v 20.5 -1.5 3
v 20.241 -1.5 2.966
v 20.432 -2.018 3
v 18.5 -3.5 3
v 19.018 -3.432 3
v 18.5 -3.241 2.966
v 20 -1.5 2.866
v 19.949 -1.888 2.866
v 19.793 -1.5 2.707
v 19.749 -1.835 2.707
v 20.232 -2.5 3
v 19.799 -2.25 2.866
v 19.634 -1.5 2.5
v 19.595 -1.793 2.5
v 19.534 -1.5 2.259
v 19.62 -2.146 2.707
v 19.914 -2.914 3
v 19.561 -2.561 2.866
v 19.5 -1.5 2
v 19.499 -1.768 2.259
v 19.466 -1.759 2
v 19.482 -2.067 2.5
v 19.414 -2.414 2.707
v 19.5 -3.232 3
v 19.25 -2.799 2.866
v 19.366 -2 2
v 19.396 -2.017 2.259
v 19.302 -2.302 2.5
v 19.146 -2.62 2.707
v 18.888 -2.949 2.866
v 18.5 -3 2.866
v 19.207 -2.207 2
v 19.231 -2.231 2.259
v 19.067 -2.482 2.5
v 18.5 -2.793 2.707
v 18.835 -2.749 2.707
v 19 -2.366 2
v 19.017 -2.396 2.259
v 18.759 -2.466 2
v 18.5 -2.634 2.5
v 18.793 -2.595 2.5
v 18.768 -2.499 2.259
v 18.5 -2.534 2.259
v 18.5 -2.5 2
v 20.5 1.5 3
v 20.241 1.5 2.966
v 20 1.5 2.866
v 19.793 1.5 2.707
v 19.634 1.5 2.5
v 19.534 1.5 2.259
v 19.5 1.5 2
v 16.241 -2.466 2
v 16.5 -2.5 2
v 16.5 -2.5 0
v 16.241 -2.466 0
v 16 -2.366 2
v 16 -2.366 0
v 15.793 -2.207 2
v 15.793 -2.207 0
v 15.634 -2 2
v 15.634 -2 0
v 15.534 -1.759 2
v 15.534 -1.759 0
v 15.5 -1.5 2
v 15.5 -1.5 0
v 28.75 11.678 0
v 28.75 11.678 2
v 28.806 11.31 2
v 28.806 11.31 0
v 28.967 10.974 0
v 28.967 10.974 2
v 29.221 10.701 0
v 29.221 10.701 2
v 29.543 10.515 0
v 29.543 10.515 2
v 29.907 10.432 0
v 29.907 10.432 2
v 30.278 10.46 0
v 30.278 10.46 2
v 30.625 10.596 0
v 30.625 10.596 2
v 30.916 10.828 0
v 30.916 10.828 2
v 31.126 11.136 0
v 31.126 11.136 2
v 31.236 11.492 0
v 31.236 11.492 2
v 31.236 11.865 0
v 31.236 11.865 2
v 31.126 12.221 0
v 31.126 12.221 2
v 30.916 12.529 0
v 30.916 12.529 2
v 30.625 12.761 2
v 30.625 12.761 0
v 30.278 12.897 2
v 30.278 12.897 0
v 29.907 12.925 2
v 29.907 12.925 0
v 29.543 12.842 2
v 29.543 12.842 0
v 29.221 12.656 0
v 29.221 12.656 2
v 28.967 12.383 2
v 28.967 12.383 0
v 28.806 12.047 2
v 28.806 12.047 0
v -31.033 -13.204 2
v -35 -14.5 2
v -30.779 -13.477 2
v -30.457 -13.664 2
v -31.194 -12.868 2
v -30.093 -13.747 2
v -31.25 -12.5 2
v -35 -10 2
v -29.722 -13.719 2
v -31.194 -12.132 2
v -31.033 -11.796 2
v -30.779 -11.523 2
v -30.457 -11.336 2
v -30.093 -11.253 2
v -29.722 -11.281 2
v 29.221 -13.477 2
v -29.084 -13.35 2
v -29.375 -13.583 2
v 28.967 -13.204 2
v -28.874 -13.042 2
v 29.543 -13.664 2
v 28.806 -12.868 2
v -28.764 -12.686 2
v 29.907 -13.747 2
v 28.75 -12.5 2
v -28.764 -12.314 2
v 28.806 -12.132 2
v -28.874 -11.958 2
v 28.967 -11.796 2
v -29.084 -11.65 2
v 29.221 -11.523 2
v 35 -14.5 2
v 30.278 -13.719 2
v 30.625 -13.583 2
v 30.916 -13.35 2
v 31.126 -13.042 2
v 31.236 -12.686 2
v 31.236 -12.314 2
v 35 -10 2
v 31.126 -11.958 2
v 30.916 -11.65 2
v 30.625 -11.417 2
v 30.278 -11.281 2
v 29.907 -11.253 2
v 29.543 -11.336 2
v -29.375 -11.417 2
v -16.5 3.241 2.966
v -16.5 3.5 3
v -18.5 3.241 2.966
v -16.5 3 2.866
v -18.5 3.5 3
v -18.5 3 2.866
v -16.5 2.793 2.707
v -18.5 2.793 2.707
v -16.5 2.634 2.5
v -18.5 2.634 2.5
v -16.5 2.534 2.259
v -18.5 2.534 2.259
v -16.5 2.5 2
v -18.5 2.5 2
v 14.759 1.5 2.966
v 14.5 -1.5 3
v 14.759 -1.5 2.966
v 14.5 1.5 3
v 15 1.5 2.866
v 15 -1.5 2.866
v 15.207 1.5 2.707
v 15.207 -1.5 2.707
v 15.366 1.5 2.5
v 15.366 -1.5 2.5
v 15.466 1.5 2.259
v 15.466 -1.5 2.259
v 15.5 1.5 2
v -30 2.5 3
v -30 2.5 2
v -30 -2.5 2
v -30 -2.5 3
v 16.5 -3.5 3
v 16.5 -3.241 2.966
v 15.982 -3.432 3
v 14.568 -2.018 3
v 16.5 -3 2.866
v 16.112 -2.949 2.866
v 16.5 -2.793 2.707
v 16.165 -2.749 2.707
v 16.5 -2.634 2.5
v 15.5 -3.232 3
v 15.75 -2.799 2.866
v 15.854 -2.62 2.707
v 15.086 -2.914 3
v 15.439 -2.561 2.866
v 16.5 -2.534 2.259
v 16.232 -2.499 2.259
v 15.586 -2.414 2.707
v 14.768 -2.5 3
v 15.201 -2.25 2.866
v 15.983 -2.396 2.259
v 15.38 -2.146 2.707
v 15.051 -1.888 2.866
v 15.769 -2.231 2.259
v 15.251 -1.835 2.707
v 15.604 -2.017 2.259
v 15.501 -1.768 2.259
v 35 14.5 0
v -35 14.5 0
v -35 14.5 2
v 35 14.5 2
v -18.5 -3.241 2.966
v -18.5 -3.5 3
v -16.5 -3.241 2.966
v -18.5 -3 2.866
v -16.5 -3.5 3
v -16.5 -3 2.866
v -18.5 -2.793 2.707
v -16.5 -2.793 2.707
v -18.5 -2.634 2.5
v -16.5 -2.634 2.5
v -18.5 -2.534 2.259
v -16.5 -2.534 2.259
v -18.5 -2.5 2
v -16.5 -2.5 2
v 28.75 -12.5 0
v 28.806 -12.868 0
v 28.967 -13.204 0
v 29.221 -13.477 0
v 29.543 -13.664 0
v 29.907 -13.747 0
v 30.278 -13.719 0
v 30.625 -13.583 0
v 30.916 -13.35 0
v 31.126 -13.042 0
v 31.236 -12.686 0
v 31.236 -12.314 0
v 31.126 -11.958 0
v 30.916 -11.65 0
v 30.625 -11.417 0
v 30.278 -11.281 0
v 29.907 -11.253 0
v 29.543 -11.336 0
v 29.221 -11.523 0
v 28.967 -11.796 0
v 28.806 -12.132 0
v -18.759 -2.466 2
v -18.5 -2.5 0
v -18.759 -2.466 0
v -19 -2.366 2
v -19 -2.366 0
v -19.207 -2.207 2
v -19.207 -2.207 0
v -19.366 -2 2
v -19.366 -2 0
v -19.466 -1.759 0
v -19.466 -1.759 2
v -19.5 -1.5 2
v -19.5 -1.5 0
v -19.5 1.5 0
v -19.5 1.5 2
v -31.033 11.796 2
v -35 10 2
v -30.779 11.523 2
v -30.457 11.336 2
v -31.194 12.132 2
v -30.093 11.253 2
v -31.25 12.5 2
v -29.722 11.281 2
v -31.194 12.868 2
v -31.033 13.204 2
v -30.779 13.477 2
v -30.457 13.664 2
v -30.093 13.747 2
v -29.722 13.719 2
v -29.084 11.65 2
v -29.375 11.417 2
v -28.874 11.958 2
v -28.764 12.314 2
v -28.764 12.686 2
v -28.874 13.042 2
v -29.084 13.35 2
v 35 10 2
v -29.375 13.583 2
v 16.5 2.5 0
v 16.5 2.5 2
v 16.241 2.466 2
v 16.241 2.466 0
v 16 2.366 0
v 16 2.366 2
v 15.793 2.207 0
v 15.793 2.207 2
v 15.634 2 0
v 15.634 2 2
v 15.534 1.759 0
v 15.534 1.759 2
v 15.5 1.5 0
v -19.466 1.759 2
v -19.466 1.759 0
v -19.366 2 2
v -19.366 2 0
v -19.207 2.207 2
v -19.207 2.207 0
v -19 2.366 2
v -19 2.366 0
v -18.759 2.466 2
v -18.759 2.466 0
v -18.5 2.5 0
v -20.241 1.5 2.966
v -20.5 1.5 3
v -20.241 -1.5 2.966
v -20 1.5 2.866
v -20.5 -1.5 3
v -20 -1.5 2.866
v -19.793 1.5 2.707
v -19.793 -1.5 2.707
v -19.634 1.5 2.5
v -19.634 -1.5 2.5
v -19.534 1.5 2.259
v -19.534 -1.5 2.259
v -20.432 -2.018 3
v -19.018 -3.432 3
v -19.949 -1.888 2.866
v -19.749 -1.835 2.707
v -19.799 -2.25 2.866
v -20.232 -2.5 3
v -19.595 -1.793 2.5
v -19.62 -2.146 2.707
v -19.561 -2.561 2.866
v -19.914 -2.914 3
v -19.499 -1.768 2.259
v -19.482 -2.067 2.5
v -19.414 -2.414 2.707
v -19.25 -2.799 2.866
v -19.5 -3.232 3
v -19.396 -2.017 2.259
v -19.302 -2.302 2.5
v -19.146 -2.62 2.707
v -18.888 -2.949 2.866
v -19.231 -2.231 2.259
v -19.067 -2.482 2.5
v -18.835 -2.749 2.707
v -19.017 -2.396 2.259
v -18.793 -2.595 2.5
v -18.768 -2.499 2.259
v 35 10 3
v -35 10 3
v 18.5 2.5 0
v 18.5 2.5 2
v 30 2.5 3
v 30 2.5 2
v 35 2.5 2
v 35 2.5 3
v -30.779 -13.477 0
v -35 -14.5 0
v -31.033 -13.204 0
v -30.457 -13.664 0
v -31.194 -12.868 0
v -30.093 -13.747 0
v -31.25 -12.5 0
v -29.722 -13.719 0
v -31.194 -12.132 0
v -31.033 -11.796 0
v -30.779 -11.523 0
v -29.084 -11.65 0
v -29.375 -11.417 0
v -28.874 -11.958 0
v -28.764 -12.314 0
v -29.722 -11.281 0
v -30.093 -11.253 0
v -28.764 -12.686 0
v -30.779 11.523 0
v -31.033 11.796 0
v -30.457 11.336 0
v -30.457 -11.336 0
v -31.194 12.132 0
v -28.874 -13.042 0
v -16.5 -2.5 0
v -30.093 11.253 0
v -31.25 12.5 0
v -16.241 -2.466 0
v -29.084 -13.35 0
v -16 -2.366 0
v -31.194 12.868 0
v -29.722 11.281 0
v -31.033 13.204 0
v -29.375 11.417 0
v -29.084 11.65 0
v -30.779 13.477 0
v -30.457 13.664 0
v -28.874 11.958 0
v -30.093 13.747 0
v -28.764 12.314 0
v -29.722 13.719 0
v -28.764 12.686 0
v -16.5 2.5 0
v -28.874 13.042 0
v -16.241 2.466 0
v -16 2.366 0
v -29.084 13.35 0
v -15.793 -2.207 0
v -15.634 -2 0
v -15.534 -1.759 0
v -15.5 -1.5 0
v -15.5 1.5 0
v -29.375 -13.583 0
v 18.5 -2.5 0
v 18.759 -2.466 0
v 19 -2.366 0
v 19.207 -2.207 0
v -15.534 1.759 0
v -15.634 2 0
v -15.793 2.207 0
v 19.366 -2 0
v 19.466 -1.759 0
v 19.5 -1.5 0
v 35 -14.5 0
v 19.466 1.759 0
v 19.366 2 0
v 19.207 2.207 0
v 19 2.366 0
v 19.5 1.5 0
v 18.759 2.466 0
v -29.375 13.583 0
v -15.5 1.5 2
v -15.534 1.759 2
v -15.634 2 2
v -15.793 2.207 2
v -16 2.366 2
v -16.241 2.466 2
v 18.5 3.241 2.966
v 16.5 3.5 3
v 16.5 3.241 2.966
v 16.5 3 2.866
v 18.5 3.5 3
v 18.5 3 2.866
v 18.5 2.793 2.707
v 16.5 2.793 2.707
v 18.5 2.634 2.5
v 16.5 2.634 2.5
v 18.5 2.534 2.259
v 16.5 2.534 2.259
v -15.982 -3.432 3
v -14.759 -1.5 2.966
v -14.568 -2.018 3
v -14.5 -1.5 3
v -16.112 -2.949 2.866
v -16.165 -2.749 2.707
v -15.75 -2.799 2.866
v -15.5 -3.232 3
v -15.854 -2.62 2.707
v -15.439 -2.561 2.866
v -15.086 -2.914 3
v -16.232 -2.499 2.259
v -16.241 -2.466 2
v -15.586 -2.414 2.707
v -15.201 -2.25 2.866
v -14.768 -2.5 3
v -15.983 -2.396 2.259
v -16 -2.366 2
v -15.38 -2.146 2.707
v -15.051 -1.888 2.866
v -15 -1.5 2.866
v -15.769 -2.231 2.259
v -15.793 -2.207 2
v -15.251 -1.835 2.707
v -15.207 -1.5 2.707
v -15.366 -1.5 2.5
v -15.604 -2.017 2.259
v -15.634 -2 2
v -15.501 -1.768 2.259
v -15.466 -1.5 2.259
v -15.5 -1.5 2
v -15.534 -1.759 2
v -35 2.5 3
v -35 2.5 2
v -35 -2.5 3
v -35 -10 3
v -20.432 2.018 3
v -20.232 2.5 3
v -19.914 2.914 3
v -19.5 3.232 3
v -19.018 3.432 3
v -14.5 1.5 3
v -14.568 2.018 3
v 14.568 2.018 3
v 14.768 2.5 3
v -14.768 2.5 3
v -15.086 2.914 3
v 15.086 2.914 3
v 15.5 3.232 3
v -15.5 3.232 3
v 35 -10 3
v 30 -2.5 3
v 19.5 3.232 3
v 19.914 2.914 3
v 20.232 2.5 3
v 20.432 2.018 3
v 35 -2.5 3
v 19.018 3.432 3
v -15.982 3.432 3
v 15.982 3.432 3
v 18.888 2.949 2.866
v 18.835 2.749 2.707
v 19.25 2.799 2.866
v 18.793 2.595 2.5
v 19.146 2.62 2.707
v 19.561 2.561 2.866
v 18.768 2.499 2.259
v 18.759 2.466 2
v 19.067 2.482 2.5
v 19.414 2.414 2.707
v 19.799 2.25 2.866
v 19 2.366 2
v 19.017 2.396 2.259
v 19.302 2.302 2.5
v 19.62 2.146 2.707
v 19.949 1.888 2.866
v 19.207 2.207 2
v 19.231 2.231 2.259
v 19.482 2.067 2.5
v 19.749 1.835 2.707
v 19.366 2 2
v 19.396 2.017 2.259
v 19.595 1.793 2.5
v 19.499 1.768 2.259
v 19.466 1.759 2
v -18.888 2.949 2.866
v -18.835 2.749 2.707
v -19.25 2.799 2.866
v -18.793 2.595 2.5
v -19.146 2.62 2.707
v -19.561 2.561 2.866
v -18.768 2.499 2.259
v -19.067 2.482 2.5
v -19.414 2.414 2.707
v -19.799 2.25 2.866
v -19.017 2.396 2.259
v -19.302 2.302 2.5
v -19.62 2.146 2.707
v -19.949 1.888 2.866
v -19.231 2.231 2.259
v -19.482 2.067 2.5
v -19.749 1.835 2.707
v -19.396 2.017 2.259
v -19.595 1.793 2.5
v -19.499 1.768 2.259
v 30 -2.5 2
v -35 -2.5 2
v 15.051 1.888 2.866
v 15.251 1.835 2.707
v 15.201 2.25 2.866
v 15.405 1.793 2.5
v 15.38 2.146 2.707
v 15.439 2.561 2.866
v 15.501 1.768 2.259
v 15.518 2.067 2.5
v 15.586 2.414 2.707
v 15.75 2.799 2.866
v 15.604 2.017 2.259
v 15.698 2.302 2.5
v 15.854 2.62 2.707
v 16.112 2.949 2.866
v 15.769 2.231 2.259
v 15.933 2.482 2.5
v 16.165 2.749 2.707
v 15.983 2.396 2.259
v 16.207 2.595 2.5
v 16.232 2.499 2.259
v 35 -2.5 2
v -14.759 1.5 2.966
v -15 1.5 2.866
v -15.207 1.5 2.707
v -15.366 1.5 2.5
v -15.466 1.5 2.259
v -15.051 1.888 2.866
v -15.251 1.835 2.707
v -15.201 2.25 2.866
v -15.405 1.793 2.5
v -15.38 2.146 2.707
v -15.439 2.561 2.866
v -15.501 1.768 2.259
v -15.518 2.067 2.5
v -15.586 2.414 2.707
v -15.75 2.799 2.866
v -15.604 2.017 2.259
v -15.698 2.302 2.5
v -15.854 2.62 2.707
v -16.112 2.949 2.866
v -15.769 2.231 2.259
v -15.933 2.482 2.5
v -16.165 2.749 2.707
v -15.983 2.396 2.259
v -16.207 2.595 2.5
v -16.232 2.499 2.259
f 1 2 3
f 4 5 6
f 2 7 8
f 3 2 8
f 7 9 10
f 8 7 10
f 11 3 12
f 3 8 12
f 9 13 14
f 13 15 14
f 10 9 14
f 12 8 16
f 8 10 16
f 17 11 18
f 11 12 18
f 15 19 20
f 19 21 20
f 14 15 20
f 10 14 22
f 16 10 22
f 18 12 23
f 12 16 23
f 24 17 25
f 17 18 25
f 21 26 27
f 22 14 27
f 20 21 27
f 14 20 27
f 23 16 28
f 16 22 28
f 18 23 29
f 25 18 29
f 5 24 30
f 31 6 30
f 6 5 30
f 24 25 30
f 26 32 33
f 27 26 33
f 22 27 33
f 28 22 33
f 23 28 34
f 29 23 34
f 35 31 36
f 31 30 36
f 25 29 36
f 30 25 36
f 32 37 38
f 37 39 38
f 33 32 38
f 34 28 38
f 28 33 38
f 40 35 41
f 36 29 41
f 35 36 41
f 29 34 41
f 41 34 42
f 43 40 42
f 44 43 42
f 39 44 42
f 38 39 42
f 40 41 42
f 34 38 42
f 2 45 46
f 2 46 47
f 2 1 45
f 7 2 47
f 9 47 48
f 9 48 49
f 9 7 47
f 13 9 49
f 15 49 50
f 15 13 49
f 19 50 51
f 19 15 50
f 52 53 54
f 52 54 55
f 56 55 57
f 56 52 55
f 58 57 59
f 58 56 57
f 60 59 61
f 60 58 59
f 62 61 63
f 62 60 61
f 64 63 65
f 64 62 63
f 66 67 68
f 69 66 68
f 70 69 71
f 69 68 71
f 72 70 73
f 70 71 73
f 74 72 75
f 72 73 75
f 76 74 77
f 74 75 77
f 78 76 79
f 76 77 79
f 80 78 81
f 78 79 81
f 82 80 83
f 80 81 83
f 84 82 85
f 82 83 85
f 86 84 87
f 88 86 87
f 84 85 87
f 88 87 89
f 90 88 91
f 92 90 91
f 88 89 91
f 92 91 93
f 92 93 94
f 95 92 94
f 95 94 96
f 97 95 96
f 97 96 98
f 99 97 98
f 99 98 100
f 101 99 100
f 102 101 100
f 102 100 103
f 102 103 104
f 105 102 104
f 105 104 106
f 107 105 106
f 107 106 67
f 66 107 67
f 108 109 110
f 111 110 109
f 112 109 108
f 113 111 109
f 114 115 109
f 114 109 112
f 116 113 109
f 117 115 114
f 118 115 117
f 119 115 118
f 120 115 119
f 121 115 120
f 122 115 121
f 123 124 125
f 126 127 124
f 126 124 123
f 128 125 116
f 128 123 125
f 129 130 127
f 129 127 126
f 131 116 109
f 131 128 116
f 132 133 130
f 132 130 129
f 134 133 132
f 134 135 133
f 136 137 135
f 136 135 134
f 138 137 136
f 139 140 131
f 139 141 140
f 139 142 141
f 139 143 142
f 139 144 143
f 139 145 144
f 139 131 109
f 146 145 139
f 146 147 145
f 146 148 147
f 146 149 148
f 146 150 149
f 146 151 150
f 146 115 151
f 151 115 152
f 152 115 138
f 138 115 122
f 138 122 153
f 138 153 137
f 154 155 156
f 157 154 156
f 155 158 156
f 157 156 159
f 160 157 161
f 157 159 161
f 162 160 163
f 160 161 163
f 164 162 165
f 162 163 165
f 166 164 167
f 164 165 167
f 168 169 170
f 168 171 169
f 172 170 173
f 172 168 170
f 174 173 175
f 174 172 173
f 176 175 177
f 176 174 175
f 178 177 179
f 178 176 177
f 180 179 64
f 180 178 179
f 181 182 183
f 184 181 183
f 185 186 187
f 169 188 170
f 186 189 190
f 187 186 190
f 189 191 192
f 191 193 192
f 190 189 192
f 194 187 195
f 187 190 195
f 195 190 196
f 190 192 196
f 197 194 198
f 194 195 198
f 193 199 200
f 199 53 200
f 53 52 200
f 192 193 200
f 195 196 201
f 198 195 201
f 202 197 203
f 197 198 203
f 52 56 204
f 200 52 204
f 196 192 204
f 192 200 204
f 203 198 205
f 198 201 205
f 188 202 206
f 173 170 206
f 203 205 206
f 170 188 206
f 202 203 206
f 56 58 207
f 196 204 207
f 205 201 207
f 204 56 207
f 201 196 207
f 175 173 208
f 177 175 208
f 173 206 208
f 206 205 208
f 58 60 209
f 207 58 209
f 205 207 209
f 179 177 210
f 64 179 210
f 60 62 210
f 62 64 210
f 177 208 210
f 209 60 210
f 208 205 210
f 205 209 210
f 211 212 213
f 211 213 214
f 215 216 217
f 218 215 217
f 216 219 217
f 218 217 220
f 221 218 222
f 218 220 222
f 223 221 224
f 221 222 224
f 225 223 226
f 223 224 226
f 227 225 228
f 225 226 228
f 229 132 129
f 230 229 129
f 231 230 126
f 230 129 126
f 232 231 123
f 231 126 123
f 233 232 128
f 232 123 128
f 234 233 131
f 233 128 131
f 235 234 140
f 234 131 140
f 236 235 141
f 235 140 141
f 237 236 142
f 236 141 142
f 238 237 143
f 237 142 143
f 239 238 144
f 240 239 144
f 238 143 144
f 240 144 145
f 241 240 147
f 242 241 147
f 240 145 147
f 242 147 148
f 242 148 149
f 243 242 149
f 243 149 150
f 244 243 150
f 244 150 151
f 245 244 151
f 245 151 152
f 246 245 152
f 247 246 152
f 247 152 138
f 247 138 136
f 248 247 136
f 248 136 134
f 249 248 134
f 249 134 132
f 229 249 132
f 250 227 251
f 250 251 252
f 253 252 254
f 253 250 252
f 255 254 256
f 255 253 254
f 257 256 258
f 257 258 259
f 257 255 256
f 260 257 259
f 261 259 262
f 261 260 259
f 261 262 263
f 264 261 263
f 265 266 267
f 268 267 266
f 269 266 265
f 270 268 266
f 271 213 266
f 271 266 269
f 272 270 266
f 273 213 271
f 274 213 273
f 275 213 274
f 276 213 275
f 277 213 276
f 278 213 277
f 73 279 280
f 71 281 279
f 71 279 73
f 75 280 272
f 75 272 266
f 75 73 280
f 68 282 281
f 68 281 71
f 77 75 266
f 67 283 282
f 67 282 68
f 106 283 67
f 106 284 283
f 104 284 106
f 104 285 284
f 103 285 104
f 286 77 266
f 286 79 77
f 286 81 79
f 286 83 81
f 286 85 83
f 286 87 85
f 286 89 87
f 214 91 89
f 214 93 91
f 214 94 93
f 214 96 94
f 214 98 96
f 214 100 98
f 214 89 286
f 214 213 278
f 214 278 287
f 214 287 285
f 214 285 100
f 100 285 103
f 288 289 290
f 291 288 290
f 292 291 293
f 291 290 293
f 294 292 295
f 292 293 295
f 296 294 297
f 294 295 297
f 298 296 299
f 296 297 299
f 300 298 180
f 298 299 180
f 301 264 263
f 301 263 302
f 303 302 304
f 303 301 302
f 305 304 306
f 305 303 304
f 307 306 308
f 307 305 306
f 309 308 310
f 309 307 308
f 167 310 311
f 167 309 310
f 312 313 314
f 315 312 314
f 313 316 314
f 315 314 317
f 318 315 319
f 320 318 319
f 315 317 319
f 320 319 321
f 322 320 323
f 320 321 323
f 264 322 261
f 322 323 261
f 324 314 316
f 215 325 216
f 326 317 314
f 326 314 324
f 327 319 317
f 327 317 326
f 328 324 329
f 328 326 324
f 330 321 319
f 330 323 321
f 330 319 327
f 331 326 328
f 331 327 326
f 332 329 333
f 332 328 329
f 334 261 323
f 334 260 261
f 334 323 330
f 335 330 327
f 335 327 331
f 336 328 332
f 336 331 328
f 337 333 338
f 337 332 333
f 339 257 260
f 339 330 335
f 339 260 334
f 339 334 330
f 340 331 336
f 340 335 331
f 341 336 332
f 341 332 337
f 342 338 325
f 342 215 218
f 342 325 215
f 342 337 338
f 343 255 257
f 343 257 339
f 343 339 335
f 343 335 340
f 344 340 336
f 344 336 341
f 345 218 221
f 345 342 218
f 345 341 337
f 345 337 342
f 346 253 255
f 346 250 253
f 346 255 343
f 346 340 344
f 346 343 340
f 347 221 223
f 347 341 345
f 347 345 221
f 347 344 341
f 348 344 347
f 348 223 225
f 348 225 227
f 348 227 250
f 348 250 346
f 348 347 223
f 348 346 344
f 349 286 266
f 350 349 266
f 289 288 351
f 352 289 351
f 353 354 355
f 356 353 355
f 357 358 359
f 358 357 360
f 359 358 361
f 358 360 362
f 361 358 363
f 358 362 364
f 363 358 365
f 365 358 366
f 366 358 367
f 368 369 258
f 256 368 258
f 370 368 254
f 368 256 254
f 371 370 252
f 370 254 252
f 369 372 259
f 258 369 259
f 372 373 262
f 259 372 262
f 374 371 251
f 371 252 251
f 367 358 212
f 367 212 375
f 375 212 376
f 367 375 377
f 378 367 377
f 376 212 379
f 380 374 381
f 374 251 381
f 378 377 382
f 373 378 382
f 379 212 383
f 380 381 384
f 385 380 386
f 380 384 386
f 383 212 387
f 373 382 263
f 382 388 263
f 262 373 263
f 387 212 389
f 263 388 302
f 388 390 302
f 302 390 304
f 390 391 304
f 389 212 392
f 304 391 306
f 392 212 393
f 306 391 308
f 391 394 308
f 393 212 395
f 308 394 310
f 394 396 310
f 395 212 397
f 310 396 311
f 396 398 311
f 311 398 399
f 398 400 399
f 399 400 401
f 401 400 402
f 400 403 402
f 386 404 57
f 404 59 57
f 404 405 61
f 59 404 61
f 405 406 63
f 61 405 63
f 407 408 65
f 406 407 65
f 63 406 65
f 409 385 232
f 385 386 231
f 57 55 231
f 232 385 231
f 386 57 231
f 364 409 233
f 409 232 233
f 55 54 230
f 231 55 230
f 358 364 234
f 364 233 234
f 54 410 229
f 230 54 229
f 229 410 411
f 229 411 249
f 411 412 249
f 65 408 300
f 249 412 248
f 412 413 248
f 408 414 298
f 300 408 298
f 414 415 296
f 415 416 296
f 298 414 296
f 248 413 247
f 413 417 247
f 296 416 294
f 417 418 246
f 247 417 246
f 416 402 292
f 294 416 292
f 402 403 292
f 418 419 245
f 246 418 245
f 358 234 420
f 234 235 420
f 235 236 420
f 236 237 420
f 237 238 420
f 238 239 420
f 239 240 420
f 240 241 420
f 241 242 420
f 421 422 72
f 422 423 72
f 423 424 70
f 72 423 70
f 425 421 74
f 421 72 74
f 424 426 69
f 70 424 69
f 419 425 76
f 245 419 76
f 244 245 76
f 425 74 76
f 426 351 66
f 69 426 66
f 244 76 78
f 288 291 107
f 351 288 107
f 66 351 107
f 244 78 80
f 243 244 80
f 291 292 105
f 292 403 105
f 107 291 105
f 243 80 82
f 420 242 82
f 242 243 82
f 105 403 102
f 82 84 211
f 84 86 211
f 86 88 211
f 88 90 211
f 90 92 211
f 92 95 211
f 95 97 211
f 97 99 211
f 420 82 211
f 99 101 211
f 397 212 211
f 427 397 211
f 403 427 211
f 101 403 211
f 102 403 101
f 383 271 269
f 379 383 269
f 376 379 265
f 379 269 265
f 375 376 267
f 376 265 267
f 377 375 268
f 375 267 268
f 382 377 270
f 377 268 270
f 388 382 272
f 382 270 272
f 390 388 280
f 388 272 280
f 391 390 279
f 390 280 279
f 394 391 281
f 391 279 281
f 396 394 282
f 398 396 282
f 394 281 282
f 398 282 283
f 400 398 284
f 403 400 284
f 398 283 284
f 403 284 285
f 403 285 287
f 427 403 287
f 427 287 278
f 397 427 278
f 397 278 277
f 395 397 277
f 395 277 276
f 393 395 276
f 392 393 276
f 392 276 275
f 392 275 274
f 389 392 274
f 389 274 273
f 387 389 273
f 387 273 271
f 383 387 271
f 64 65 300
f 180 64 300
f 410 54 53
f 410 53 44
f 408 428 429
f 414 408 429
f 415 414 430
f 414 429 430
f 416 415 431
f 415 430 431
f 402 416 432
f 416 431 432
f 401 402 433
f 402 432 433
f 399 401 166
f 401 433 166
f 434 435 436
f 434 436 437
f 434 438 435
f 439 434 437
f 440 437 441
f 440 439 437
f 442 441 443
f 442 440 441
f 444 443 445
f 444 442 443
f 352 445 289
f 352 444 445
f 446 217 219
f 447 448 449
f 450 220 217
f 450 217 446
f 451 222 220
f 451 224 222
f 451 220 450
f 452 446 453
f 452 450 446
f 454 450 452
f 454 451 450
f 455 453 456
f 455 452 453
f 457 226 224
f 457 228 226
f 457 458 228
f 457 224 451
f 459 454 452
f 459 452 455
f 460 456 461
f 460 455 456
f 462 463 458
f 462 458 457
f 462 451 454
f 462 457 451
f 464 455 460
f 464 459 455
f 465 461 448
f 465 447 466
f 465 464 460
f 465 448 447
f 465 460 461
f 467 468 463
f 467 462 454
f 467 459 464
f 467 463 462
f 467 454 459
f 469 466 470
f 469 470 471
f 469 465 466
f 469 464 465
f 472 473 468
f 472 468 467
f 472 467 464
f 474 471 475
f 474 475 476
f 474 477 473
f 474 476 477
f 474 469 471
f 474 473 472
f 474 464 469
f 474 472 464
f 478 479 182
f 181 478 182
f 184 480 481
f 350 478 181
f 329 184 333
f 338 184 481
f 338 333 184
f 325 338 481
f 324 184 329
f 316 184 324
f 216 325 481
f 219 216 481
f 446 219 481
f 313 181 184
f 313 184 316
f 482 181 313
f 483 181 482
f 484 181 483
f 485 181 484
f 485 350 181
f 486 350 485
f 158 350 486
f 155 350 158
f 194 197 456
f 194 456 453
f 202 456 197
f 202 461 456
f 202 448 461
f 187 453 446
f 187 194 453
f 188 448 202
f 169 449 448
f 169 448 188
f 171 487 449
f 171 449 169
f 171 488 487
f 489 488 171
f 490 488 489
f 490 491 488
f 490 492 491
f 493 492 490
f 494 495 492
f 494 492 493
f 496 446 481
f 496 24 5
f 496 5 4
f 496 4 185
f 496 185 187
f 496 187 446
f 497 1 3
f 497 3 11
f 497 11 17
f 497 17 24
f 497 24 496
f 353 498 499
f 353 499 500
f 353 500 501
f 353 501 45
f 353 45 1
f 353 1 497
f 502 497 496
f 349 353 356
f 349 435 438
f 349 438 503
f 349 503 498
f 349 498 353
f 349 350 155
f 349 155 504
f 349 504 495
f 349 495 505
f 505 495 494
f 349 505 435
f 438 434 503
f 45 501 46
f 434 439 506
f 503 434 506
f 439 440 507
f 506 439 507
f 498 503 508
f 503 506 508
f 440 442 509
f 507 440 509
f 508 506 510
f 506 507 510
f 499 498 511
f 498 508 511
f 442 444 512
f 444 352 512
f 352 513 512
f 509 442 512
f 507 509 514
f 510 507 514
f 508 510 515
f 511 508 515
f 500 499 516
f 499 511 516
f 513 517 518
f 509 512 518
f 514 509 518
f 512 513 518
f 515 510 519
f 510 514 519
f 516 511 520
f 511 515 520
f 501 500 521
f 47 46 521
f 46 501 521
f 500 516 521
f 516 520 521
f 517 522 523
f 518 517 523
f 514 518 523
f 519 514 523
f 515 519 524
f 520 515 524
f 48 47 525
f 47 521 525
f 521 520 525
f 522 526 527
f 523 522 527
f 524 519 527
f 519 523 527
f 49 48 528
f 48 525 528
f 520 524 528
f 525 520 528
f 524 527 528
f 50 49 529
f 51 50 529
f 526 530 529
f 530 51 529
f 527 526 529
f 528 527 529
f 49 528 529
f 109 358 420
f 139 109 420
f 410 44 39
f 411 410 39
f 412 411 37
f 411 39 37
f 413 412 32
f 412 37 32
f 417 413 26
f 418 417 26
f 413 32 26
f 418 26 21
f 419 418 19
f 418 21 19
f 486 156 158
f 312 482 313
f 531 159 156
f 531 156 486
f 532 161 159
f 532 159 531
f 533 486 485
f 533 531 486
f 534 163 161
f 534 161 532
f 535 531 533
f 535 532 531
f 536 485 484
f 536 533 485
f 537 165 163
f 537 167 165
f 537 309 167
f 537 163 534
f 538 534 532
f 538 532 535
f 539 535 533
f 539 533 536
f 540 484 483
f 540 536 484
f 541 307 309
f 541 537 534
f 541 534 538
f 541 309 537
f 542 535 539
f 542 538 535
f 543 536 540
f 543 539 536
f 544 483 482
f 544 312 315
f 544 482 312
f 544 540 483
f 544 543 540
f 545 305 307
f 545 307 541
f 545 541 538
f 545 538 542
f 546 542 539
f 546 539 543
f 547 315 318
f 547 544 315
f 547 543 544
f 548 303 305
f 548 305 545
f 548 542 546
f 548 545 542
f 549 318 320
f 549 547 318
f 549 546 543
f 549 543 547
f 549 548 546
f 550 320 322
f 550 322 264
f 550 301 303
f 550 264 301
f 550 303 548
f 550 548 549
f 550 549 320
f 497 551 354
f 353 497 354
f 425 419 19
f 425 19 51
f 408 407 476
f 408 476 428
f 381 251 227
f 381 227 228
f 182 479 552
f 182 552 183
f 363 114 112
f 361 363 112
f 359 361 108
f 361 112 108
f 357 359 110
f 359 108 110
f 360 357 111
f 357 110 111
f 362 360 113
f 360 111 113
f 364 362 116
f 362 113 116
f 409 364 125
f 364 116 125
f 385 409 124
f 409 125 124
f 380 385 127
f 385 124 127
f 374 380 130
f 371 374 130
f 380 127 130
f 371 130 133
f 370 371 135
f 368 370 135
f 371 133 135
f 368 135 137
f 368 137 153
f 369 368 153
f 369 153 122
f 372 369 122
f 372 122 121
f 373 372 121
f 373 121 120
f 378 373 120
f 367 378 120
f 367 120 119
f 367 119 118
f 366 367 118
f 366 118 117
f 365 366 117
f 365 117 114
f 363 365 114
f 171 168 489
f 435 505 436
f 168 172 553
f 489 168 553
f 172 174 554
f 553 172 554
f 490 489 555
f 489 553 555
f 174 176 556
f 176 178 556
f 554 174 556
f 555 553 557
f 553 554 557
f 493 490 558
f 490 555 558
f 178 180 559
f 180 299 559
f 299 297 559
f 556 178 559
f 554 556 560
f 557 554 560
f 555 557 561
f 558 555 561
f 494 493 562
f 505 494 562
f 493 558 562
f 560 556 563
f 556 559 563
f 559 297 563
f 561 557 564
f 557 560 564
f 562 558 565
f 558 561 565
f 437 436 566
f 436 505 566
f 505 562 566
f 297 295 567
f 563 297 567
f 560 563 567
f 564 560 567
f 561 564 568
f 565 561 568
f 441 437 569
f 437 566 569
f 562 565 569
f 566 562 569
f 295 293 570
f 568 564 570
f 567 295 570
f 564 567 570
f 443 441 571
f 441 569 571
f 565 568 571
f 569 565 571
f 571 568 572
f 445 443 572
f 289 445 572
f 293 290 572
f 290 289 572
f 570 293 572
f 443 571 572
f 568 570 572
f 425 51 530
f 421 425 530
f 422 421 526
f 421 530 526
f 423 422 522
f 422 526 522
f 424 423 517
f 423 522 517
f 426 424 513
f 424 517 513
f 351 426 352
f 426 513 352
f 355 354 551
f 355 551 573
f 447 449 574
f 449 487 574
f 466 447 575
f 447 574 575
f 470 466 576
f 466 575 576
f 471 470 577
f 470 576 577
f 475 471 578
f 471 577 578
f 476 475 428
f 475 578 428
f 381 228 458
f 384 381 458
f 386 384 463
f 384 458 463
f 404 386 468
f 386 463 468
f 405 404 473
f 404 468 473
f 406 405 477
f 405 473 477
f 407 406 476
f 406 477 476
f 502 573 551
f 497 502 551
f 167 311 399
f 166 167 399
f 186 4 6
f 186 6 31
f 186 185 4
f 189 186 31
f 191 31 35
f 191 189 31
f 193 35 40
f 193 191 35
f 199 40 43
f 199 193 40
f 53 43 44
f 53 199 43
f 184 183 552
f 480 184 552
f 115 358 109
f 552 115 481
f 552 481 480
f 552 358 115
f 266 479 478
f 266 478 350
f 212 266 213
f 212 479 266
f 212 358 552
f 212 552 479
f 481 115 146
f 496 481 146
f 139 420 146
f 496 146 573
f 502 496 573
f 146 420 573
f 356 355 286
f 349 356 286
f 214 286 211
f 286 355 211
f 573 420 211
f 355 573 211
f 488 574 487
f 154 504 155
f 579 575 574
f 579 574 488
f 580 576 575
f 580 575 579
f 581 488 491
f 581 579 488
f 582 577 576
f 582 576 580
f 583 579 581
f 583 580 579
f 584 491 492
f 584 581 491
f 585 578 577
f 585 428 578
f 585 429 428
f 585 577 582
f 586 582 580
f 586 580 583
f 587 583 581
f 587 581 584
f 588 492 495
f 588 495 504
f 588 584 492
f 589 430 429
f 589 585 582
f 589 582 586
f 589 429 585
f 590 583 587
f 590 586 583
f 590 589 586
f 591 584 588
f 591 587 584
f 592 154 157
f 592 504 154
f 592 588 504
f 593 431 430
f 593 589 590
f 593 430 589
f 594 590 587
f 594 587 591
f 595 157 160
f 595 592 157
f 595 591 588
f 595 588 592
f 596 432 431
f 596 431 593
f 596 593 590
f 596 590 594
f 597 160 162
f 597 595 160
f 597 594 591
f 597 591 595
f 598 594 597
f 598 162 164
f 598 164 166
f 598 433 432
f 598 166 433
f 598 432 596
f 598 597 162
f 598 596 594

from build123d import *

# Parameters (mm, degrees)
F0_W     = 4
F0_H     = 5
F1_DEPTH = 3
F0_W_2   = 5
F0_W_3   = 70
F0_H_2   = 4.5
F2_DEPTH = 2
F3_D     = 2.5
F4_F1_R  = 1
F4_F2_R  = 1


with BuildPart() as f1:
    # F0 (on Top) → F1 (new body)
    with BuildSketch(Plane.XY):
        Polygon((-35, -10), (35, -10), (35, -2.5), (30, -2.5), (30, 2.5), (35, 2.5), (35, 10), (-35, 10), (-35, 2.5), (-30, 2.5), (-30, -2.5), (-35, -2.5), align=None)
        with Locations((-17.5, 0)):
            Rectangle(F0_W, F0_H, mode=Mode.SUBTRACT)
        with Locations((17.5, 0)):
            Rectangle(F0_W, F0_H, mode=Mode.SUBTRACT)
    extrude(amount=F1_DEPTH)

    # F0 (on Top) → F2 (join)
    with BuildSketch(Plane.XY):
        with Locations((-32.5, 0)):
            Rectangle(F0_W_2, F0_H)
        with Locations((0, 12.25)):
            Rectangle(F0_W_3, F0_H_2)
        with Locations((0, -12.25)):
            Rectangle(F0_W_3, F0_H_2)
        with Locations((32.5, 0)):
            Rectangle(F0_W_2, F0_H)
    extrude(amount=F2_DEPTH)

    # F3 (through all)
    with Locations(Plane(origin=(0, 0, 0), x_dir=(1, 0, 0), z_dir=(0, 0, -1))):
        with Locations((-30, 12.5), (-30, -12.5), (30, -11.6784099489), (30, 12.5)):
            Hole(F3_D / 2)

    # F4: fillet of radius 1 on 12 edges, made by hand

    # F4_f1
    f4_f1_edges = [f1.edges().sort_by_distance(p)[0] for p in [
        (-19.5, 2.5, 1.5),
        (-15.5, 2.5, 1.5),
        (-15.5, -2.5, 1.5),
        (-19.5, -2.5, 1.5),
        (19.5, 2.5, 1.5),
        (19.5, -2.5, 1.5),
        (15.5, -2.5, 1.5),
        (15.5, 2.5, 1.5),
    ]]
    fillet(f4_f1_edges, radius=F4_F1_R)

    # F4_f2
    f4_f2_edges = [f1.edges().sort_by_distance(p)[0] for p in [
        (15.5, 0, 3),
        (-15.5, 0, 3),
        (-19.5, 0, 3),
        (19.5, 0, 3),
        (19.2071067812, 2.2071067812, 3),
        (19.2071067812, -2.2071067812, 3),
        (-19.2071067812, -2.2071067812, 3),
        (-19.2071067812, 2.2071067812, 3),
        (-15.7928932188, 2.2071067812, 3),
        (-15.7928932188, -2.2071067812, 3),
        (15.7928932188, -2.2071067812, 3),
        (15.7928932188, 2.2071067812, 3),
    ]]
    fillet(f4_f2_edges, radius=F4_F2_R)


solid = f1.part
